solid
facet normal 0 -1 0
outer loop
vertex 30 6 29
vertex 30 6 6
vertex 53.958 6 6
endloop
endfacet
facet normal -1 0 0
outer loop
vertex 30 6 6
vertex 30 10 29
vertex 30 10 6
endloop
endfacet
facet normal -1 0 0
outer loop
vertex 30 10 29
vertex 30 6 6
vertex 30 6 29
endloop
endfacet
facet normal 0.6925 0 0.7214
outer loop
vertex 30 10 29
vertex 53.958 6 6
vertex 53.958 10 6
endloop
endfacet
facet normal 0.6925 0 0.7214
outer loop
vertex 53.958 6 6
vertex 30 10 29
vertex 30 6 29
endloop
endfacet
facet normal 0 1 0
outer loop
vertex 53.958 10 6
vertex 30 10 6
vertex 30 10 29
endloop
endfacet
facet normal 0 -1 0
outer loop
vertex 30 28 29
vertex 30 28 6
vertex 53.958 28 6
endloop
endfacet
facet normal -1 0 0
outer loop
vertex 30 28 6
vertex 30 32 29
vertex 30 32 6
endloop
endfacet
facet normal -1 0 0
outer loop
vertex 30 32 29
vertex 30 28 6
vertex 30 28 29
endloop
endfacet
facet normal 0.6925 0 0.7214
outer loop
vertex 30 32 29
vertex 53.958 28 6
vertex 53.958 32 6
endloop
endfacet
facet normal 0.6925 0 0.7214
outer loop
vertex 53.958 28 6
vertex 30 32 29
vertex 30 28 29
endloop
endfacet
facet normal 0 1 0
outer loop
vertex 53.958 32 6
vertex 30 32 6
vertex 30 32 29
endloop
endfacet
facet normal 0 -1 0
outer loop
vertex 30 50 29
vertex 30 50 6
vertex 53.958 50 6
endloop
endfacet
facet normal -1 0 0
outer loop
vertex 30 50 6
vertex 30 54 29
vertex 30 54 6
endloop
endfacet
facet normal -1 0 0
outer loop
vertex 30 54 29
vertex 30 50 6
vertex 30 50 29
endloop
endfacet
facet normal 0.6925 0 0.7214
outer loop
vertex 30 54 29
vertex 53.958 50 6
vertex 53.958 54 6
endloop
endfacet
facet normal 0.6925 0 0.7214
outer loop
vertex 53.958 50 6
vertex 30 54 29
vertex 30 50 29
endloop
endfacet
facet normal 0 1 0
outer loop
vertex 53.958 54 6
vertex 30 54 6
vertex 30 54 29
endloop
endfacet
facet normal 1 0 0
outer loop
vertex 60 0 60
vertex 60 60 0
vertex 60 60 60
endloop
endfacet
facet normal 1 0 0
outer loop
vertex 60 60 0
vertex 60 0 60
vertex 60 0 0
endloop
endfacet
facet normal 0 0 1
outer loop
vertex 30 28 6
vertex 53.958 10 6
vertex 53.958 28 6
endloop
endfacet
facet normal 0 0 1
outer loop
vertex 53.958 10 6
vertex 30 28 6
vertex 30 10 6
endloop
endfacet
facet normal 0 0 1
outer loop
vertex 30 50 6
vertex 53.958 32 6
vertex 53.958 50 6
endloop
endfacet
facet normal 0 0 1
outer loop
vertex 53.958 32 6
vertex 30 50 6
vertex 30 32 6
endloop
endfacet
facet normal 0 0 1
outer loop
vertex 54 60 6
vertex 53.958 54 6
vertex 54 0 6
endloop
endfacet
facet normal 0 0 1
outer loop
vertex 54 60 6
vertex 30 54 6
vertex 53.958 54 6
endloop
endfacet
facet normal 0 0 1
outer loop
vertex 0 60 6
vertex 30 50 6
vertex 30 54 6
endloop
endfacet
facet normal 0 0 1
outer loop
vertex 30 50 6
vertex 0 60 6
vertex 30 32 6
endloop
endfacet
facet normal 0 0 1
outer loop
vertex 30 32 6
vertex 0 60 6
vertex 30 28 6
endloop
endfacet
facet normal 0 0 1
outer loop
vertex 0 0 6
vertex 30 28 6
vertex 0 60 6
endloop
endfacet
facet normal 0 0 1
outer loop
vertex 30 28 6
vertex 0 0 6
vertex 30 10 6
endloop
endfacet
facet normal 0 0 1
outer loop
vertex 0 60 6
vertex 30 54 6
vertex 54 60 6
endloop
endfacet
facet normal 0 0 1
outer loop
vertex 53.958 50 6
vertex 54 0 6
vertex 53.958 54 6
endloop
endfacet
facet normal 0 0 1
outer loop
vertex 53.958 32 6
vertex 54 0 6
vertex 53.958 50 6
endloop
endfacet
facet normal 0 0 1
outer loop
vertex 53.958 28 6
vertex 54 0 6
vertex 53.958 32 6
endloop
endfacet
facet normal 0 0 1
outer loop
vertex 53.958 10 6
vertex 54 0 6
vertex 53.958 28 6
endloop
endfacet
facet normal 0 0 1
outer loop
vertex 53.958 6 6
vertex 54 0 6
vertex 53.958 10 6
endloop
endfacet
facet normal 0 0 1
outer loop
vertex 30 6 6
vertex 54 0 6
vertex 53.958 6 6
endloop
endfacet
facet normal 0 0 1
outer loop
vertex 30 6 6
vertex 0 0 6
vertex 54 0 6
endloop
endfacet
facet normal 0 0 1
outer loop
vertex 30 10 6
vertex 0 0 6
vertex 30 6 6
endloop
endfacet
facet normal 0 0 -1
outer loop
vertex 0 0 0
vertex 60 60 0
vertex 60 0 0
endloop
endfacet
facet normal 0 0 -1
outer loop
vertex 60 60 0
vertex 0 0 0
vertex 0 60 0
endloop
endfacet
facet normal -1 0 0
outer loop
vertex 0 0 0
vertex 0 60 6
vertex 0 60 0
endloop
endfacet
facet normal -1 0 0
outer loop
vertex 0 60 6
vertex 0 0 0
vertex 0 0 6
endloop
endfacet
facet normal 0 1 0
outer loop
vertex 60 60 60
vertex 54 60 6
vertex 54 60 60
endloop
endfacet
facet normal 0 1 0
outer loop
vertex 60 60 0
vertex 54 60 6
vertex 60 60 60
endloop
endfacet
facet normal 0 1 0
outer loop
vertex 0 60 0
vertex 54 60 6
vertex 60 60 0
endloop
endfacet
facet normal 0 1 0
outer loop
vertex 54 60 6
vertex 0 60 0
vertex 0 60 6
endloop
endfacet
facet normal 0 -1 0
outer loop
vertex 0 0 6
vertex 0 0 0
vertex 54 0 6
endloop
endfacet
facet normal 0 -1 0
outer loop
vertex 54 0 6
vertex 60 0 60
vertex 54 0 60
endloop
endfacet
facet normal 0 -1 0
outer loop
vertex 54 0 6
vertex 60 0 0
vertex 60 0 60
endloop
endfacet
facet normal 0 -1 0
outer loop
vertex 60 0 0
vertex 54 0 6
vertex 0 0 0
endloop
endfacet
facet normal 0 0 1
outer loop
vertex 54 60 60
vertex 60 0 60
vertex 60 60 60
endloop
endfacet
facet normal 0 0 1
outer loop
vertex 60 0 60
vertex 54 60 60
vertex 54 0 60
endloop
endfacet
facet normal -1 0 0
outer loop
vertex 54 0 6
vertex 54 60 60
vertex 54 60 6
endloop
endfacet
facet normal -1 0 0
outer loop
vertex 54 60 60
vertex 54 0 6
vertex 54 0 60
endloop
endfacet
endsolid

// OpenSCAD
$fn = 32;

// ----------------------------------------------------------------------
// Rib bracket: 3-gusset L bracket
// ----------------------------------------------------------------------

// --- parameters (mm) ---
base_l = 60;              // foot length, X
base_w = 60;              // foot width, Y
base_t = 6;               // foot thickness
plate_t = 6;              // upright plate thickness
plate_h = 60;             // overall height
gus_l = 24;               // gusset leg along the foot
gus_h = 24;               // gusset height
gus_t = 4;                // gusset thickness
gus_edge = 6;             // gusset margin from the foot edge
n_gus = 3;                // gusset count

gus_pitch = (base_w - 2 * gus_edge - gus_t) / (n_gus - 1);  // gusset pitch

union() {
  cube([base_l, base_w, base_t]);
  translate([base_l - plate_t, 0, base_t - 1])
    cube([plate_t, base_w, plate_h - base_t + 1]);
  for (i = [0 : n_gus - 1])
    translate([base_l - plate_t - gus_l, gus_edge + i * gus_pitch, base_t - 1])
      rotate([-90, 0, 0])
        linear_extrude(height = gus_t)
          polygon(points = [[0, 0], [gus_l + 1, 0], [0, -gus_h]]);
}
